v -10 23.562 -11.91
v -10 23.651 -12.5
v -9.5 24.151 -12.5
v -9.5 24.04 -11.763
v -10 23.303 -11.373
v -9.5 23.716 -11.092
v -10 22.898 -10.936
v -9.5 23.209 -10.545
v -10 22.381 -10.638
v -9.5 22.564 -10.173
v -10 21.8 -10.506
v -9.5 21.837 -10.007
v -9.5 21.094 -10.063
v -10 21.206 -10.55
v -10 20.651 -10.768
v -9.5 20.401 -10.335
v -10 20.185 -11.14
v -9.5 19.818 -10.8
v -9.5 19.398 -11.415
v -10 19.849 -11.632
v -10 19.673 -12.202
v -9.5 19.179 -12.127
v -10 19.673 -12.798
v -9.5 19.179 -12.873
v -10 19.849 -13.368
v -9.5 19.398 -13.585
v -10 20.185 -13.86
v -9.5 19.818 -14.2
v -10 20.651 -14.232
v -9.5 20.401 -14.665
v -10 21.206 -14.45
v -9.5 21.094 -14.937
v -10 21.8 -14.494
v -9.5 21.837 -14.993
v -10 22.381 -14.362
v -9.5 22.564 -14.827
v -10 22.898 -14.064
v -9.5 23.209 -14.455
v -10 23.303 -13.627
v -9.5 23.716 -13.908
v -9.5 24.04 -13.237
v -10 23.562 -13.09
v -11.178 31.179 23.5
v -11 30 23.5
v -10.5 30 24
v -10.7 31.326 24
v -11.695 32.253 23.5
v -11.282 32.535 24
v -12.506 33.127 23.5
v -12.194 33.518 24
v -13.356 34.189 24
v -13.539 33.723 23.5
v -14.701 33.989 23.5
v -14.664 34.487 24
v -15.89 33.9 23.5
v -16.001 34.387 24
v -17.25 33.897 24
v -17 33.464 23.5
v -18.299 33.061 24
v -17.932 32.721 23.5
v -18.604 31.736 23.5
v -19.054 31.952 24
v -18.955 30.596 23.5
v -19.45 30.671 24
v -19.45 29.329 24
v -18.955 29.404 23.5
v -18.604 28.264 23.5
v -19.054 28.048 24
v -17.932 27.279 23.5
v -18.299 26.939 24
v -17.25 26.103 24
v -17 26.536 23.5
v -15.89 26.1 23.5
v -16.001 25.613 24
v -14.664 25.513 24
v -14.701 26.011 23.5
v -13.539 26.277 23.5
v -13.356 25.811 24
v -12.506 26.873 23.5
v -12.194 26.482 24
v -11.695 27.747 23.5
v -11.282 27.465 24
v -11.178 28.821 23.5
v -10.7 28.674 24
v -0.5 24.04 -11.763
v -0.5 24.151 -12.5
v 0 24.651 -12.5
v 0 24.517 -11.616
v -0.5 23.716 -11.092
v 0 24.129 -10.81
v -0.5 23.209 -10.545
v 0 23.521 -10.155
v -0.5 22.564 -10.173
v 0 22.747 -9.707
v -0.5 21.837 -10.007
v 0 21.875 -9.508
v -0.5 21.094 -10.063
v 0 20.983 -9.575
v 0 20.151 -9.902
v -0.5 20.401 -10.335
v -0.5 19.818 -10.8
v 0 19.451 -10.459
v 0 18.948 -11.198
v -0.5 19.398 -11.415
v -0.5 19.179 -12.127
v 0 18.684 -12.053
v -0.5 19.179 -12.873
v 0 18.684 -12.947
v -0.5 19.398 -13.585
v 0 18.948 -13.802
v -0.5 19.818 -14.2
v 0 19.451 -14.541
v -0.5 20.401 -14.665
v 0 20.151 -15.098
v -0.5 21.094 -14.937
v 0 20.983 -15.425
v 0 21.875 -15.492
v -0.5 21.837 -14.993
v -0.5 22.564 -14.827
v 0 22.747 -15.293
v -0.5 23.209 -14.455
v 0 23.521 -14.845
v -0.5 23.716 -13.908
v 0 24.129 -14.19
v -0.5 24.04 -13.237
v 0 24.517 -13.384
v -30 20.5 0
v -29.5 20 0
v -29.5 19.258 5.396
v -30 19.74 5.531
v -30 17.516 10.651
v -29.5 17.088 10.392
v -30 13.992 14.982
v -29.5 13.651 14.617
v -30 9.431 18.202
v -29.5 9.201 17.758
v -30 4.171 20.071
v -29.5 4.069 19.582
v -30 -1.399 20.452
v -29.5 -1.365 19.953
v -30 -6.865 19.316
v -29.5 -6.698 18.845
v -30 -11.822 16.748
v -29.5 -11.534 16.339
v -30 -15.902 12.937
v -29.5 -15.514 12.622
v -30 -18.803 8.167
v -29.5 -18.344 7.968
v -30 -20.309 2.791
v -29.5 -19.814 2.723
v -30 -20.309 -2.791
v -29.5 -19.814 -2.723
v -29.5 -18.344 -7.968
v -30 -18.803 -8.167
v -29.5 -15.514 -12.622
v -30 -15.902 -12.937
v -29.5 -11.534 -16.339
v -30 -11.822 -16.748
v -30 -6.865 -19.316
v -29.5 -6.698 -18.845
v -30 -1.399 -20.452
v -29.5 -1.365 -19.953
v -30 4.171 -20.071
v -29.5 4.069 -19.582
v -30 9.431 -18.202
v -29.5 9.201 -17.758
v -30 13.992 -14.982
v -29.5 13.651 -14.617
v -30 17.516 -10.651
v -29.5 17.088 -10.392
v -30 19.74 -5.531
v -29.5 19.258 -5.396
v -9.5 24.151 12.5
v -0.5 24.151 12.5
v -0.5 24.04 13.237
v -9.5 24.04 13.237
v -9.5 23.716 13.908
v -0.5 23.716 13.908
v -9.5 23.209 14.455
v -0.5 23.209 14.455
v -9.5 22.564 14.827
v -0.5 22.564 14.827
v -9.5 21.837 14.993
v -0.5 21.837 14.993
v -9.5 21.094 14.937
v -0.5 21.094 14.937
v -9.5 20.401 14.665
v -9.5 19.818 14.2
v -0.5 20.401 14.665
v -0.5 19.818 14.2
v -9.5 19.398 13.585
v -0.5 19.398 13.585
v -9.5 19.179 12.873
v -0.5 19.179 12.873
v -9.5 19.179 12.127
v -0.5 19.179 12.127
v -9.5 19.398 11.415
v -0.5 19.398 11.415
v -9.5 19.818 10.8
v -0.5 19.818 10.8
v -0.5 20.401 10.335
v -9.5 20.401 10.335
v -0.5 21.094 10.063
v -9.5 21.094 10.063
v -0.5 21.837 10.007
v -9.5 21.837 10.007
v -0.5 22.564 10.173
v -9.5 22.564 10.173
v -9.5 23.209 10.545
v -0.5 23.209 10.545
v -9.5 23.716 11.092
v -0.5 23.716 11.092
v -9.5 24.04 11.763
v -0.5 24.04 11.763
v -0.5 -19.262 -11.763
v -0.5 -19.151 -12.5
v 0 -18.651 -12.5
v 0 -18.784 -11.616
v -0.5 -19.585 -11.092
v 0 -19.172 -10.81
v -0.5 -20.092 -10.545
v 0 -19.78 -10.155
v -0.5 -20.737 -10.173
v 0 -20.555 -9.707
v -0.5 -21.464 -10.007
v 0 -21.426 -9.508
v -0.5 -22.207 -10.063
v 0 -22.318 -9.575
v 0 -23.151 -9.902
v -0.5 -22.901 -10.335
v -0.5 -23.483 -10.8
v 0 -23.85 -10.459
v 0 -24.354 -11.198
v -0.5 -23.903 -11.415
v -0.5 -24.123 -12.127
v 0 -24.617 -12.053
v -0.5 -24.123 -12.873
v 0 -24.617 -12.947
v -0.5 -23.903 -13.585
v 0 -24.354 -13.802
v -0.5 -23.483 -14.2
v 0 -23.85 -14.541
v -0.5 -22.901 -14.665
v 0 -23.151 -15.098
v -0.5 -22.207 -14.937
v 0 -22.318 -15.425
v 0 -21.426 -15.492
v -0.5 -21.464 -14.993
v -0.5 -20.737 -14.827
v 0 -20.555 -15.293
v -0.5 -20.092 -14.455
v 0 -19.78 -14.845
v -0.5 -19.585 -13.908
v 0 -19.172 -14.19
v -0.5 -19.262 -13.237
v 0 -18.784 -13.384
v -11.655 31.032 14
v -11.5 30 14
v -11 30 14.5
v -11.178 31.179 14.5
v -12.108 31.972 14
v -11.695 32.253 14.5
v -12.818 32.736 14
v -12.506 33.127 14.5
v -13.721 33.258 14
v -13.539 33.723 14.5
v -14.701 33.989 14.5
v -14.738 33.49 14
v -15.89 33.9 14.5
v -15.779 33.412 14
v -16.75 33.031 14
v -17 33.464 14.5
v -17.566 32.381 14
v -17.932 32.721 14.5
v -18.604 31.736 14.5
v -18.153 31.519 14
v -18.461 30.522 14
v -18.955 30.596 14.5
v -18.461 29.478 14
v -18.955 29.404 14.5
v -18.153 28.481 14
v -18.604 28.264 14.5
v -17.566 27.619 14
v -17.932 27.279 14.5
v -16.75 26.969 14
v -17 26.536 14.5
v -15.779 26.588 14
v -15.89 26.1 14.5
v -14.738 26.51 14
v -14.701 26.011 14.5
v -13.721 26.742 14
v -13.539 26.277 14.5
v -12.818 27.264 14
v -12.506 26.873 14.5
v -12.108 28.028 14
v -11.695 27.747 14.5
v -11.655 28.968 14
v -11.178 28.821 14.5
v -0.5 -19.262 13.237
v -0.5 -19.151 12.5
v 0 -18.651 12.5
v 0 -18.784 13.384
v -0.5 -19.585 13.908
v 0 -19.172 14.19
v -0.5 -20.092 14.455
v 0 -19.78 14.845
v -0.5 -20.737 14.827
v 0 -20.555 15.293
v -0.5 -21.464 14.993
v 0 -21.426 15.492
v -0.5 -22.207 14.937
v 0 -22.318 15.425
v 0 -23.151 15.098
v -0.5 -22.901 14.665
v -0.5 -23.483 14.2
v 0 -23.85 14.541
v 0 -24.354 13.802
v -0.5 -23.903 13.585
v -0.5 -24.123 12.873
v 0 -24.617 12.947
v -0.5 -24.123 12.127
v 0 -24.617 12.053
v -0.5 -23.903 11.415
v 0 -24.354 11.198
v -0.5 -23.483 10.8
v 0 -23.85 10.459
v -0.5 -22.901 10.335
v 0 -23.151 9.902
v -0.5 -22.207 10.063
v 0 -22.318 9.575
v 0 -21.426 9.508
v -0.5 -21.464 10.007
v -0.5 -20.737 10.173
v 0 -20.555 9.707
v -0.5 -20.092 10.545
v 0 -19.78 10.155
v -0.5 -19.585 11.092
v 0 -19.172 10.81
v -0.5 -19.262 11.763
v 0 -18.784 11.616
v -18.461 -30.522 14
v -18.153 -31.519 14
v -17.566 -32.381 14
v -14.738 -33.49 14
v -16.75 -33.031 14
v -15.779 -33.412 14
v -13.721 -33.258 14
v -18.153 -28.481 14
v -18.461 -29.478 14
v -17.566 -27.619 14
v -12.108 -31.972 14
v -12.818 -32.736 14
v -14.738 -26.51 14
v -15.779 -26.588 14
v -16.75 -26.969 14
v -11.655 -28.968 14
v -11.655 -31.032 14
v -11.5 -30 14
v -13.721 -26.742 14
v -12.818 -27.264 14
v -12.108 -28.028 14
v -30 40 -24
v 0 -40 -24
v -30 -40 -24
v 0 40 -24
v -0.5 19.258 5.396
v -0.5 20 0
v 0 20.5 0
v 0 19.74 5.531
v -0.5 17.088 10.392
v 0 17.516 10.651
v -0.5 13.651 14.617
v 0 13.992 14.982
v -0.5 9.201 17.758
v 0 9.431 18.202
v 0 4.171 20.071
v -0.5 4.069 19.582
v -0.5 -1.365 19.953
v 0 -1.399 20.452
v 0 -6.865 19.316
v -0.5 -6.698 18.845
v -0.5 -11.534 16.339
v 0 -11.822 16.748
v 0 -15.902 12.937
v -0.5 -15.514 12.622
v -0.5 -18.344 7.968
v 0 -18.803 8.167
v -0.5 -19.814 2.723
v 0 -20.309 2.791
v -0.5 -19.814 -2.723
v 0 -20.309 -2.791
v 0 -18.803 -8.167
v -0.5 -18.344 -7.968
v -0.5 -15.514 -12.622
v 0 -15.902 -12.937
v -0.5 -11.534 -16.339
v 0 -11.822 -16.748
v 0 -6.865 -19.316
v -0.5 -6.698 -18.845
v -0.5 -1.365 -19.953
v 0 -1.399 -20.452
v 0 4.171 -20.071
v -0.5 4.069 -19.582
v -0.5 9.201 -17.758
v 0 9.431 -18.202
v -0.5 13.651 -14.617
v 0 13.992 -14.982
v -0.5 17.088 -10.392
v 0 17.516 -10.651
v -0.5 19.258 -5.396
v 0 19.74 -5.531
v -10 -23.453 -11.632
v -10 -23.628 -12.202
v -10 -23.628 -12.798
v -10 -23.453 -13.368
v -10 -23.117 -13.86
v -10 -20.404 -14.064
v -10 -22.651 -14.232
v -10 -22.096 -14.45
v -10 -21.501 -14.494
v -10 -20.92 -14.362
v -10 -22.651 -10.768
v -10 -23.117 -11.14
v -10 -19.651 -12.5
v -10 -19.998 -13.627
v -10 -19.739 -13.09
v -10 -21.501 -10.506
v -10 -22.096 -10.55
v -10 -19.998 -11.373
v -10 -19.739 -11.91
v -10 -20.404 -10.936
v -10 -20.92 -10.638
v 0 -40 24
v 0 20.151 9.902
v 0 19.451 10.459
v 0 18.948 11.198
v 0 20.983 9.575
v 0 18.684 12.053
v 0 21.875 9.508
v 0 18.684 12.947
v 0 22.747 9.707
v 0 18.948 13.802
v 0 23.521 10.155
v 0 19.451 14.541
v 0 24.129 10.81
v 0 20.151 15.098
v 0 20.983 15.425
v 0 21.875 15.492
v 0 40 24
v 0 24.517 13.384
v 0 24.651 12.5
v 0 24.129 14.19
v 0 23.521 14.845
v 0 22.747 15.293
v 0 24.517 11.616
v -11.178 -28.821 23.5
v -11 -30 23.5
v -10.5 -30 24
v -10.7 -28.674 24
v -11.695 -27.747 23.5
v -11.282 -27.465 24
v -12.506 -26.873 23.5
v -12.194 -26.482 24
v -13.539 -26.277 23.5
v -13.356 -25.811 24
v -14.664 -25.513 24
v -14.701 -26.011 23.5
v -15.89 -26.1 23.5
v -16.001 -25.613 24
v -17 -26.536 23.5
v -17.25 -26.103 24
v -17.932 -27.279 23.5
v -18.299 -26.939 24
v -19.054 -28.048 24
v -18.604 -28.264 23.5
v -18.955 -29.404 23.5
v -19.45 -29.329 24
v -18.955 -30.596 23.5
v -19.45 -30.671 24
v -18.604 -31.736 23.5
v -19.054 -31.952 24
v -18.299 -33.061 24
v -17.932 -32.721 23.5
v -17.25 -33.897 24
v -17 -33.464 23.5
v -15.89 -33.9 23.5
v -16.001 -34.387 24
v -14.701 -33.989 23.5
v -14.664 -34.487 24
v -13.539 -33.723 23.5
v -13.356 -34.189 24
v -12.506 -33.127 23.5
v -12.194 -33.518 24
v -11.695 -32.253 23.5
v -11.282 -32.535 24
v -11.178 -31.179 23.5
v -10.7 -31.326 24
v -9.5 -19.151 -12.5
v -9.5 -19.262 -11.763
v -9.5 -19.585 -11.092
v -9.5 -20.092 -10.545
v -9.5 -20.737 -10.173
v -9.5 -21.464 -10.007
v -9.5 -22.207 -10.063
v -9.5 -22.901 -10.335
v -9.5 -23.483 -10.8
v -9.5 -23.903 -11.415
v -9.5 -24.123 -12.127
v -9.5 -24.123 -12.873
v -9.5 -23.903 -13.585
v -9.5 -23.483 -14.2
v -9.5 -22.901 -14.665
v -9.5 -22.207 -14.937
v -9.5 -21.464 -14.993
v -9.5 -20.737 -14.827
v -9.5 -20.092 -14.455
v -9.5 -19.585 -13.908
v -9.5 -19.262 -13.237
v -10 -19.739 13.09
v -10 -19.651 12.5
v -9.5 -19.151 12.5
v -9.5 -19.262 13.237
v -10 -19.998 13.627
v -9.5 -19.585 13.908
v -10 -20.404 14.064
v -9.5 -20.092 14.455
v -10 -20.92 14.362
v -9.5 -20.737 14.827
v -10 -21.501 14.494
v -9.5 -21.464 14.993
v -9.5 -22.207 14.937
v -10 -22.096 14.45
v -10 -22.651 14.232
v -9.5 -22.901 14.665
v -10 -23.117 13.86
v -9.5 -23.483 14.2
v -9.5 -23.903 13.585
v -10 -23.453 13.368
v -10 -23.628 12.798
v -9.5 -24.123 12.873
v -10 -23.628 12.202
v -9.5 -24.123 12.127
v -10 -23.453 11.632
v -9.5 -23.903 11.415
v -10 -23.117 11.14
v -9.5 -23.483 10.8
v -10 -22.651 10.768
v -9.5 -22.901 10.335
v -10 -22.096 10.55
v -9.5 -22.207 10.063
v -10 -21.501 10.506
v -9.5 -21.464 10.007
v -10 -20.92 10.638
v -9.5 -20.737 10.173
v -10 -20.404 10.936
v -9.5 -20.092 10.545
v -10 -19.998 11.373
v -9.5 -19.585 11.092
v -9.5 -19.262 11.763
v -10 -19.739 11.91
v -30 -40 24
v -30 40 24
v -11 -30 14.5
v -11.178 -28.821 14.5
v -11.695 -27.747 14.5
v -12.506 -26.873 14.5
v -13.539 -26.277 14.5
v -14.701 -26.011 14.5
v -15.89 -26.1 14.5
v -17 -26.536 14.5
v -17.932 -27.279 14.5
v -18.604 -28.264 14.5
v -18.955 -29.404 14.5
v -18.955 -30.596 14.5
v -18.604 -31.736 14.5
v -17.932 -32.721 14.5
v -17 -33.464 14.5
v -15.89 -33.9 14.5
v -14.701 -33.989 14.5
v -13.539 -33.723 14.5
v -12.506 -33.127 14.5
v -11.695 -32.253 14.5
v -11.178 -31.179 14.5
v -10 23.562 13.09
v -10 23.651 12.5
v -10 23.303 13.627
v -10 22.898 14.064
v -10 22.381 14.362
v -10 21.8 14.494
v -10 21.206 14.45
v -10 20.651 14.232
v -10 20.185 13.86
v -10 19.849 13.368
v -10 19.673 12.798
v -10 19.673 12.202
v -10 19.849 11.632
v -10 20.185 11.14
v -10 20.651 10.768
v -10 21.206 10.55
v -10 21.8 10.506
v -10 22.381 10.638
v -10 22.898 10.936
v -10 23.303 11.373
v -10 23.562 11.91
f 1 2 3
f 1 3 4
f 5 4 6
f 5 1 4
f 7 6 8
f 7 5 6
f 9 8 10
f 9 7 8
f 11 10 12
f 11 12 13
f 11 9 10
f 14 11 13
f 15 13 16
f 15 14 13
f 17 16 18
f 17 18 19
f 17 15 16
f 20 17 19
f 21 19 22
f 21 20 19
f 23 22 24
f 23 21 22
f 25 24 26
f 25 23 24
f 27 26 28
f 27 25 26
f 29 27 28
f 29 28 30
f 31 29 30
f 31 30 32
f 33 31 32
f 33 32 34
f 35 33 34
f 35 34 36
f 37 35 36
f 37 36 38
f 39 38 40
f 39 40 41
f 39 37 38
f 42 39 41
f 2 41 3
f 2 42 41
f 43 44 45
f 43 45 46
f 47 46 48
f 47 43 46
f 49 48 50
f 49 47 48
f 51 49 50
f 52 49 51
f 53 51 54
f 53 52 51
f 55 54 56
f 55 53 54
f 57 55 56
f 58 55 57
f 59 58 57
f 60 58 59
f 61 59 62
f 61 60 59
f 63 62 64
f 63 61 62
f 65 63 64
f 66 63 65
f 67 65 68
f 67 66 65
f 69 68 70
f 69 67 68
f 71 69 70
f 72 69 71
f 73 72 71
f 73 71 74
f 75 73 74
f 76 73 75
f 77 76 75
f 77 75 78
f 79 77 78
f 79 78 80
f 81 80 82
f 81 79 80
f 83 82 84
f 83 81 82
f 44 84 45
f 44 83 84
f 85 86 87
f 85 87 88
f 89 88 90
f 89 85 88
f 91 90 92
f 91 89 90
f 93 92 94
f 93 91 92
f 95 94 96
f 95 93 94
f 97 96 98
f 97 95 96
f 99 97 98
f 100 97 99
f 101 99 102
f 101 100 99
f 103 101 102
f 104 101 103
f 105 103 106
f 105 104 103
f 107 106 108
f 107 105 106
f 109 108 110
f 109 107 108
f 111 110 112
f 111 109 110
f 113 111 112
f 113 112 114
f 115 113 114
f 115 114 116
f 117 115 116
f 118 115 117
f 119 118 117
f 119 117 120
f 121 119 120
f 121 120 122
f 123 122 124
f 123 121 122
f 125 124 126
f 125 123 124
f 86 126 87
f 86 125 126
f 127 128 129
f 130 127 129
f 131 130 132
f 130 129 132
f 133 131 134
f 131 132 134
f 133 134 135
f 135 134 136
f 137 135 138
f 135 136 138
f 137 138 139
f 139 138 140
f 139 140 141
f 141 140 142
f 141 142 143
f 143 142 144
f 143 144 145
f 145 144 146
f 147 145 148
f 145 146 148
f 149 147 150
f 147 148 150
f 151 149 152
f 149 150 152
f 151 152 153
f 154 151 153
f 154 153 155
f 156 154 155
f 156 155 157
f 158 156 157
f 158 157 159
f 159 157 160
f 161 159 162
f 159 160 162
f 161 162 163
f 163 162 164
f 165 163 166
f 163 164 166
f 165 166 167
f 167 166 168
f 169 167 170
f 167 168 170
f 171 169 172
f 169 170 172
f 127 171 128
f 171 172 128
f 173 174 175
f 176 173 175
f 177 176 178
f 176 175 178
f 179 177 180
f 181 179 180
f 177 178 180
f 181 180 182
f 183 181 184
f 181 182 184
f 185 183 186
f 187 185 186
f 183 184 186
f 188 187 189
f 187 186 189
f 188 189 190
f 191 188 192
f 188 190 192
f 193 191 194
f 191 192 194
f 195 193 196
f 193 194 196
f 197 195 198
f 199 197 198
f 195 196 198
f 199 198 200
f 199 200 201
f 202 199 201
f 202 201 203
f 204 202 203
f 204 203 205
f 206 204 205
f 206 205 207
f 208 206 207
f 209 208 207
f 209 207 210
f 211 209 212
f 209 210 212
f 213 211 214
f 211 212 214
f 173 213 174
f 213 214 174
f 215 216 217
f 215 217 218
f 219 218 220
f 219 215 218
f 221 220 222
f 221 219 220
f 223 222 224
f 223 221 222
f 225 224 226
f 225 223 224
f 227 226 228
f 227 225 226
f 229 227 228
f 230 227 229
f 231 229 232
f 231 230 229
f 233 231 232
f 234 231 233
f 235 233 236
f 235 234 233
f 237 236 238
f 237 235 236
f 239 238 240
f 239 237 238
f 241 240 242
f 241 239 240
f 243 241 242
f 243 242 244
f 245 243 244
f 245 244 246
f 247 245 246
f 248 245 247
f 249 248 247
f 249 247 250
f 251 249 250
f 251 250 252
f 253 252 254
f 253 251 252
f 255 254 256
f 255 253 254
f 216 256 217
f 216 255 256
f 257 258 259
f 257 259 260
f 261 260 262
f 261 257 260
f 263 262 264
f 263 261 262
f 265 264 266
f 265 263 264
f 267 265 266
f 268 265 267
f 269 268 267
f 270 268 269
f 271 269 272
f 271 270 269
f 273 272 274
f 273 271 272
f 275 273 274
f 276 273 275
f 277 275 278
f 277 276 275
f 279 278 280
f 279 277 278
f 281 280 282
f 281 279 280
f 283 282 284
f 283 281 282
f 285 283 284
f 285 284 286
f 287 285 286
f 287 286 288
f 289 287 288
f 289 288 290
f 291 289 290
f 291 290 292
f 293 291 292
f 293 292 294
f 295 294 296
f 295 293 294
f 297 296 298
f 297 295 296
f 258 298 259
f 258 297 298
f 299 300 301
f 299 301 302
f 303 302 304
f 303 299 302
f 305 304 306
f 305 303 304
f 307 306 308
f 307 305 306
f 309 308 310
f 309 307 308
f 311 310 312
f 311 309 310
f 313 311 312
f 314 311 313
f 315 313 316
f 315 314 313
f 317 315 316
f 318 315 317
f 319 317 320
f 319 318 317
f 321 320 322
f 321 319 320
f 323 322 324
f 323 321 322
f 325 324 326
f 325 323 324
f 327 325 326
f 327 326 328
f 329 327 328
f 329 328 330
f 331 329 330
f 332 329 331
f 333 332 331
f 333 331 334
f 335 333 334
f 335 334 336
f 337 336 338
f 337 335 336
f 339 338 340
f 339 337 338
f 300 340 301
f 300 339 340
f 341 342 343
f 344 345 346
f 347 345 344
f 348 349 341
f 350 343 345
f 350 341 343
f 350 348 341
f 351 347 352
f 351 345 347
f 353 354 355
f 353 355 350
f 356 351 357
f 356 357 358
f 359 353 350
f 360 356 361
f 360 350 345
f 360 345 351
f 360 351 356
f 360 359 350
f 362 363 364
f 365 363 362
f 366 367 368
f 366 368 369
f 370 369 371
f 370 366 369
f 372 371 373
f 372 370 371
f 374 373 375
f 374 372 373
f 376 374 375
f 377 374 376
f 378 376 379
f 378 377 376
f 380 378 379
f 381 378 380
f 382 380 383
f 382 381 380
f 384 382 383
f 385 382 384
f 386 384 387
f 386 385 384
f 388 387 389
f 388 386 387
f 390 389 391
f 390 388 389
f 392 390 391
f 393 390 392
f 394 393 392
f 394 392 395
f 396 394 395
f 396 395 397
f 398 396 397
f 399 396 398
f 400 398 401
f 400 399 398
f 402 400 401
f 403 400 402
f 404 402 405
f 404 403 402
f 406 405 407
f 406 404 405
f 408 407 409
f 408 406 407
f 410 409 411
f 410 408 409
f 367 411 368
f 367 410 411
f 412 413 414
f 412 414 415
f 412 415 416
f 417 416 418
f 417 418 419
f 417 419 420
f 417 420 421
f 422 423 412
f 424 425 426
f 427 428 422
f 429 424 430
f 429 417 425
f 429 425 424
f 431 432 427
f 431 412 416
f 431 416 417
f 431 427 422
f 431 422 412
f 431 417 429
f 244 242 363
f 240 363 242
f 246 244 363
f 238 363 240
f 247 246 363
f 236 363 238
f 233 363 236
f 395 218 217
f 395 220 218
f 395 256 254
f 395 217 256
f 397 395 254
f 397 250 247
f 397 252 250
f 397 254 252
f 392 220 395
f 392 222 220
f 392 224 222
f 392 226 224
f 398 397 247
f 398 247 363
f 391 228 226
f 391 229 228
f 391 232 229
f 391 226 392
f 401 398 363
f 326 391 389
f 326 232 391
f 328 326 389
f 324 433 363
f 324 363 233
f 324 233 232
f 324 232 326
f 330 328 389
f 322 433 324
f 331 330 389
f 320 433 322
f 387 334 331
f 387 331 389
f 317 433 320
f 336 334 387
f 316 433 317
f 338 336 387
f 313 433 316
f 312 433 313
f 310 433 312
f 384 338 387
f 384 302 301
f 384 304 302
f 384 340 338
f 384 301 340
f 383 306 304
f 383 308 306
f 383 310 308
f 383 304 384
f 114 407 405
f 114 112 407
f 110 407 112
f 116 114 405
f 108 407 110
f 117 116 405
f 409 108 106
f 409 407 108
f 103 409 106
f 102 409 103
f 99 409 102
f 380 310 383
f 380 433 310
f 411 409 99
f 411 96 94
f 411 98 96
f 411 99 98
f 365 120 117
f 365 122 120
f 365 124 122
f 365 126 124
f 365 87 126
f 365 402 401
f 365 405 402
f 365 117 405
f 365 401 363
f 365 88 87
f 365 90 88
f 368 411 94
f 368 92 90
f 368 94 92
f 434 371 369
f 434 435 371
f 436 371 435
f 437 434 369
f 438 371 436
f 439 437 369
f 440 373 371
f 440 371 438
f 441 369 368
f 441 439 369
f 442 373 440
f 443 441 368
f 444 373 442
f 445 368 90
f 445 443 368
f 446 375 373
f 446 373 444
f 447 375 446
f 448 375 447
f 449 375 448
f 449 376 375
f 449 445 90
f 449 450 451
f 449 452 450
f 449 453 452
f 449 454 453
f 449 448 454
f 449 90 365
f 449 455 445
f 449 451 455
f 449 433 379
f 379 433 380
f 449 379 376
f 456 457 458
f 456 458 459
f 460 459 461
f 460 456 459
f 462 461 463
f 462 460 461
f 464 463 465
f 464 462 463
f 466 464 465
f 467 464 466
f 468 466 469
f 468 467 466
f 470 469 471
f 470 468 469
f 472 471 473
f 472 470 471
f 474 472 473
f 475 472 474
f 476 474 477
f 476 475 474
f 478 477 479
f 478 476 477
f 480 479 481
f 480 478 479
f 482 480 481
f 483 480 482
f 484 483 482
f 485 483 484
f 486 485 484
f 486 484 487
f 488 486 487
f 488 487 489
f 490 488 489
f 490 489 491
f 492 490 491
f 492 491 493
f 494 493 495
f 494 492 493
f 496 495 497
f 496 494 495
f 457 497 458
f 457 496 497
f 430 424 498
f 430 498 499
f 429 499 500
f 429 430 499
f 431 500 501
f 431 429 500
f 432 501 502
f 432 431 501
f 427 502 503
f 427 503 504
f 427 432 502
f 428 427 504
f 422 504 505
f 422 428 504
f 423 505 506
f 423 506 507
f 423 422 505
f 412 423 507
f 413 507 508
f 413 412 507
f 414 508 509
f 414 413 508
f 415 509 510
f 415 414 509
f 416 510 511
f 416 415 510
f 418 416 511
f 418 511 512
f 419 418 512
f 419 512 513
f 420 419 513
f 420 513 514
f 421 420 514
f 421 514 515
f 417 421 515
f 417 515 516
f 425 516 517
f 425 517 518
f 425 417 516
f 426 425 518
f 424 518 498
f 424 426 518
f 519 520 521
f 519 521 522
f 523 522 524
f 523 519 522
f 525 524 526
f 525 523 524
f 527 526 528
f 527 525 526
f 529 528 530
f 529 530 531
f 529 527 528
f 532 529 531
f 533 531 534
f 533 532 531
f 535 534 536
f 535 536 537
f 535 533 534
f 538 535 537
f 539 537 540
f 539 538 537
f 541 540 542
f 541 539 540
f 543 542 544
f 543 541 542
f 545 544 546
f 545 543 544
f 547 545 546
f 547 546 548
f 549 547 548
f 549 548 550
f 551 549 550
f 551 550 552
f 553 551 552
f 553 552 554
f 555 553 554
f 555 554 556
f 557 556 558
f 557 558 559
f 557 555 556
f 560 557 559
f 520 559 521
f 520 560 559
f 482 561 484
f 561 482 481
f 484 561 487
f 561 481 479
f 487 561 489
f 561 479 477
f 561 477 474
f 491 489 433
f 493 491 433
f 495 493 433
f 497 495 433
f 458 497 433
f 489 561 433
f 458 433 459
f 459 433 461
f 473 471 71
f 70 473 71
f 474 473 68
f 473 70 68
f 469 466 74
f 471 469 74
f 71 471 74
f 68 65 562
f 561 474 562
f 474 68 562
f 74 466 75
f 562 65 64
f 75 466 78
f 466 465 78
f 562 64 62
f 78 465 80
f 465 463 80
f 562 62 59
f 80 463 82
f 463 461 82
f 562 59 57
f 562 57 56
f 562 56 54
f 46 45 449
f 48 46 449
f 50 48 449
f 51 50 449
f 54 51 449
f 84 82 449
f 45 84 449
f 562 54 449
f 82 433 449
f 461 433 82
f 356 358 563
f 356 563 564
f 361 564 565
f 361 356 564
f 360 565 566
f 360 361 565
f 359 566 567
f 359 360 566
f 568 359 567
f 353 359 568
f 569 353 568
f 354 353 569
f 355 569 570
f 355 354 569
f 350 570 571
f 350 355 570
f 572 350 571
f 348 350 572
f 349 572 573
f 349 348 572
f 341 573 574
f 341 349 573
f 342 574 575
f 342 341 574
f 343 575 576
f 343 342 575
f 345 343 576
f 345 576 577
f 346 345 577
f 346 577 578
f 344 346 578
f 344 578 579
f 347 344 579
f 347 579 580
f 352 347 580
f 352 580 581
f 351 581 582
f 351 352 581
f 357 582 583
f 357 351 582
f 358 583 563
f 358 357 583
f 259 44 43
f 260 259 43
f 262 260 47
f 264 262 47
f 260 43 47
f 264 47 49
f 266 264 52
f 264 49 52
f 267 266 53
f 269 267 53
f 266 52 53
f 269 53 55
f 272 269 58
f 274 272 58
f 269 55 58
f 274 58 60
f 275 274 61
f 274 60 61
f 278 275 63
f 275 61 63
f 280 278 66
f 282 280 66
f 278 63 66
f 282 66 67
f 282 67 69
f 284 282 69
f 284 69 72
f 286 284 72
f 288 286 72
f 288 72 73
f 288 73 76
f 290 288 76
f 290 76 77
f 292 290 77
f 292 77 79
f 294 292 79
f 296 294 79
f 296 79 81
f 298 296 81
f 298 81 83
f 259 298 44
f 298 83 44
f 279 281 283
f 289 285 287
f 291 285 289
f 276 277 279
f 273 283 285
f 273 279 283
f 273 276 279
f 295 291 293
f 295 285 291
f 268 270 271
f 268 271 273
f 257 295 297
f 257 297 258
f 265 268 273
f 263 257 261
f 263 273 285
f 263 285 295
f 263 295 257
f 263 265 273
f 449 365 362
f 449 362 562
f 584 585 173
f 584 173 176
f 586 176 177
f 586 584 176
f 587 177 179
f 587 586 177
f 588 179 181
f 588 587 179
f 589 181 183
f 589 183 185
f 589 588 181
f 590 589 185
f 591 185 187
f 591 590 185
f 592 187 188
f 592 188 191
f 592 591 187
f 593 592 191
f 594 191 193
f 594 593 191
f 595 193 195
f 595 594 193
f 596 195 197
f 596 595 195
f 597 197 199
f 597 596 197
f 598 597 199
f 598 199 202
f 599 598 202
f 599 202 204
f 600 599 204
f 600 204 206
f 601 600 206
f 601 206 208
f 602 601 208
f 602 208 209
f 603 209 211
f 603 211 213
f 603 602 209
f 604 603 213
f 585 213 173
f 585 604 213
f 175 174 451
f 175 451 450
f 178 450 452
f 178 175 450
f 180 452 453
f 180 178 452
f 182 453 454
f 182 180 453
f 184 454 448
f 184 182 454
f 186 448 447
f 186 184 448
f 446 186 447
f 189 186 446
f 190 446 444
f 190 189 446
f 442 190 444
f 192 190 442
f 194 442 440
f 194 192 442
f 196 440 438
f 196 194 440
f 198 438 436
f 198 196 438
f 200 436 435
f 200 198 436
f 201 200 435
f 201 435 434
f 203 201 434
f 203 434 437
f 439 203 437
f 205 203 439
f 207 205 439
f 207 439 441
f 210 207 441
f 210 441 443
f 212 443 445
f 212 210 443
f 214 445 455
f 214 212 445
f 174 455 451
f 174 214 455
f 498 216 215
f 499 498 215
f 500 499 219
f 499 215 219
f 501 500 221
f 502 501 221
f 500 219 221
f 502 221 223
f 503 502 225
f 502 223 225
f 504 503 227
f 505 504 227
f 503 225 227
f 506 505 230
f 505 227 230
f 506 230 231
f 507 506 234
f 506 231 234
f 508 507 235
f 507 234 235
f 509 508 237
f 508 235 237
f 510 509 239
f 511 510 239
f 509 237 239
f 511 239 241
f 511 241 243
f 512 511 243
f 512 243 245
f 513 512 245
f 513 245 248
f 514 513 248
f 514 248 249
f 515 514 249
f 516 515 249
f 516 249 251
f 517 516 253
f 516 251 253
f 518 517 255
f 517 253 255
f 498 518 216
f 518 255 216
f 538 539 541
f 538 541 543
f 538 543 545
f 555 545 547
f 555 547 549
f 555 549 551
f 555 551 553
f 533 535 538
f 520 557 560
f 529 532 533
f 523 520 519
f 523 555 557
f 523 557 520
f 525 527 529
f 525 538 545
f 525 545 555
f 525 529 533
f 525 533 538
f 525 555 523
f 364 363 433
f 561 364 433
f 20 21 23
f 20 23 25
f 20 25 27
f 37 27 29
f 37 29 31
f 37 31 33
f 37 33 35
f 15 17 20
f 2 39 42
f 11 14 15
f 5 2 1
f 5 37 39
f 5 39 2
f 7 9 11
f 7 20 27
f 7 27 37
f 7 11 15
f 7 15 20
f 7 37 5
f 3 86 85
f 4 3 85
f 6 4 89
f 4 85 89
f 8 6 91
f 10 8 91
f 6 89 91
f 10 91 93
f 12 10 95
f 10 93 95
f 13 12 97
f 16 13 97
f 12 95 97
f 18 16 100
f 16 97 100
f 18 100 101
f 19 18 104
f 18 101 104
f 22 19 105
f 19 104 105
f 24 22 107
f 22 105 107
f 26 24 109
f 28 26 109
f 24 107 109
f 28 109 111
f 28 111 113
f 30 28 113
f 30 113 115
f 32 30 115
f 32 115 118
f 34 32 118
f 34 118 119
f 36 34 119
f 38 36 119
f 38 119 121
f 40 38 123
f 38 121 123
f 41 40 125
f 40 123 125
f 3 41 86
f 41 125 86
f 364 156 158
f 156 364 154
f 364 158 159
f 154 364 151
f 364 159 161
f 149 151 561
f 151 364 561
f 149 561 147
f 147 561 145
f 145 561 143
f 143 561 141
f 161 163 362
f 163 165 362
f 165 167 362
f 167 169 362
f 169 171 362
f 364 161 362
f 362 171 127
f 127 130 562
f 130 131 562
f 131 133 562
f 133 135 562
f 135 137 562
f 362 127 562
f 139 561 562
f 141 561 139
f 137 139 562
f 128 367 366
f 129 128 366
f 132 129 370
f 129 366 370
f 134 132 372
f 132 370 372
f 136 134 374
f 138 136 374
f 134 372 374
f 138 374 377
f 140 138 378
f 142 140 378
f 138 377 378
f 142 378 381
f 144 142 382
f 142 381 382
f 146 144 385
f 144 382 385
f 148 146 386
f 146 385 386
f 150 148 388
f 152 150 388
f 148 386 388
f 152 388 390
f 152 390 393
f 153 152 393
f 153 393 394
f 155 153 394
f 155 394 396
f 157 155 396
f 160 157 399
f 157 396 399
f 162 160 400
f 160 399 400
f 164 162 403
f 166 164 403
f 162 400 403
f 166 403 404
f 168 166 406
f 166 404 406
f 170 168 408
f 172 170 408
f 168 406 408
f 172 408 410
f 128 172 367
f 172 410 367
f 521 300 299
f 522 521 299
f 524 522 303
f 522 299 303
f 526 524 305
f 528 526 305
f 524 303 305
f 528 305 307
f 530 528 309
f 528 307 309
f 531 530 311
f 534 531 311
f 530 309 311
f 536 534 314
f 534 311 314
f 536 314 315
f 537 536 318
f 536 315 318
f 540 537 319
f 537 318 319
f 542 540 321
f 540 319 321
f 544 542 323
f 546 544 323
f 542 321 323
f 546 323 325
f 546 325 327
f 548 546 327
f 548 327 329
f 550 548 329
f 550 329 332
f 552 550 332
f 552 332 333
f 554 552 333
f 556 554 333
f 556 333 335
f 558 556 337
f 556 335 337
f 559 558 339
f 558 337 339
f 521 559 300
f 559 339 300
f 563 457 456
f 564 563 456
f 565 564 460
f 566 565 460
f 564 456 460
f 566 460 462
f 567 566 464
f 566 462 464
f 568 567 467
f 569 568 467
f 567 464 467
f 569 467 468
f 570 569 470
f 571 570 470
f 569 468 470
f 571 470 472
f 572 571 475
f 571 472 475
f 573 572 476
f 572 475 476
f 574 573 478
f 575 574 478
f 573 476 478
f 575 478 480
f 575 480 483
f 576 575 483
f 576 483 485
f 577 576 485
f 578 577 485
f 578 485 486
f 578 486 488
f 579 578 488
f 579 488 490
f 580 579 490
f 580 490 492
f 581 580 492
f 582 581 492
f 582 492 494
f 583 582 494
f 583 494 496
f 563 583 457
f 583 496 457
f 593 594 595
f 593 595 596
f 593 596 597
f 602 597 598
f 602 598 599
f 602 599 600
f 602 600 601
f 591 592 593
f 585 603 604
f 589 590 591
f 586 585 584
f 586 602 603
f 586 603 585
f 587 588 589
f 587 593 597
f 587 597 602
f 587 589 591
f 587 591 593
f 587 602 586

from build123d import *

# Parameters (mm, degrees)
F0_W     = 80
F0_H     = 48
F0_R     = 2.5
F0_R_2   = 20
F1_DEPTH = 30
F2_DEPTH = 10
F3_SIZE  = 0.5
F4_R     = 4
F5_DEPTH = 10
F6_SIZE  = 0.5


with BuildPart() as f1:
    # F0 (on Right) → F1 (new body)
    with BuildSketch(Plane.YZ):
        Rectangle(F0_W, F0_H)
        with Locations((-21.650635, -12.5)):
            Circle(F0_R, mode=Mode.SUBTRACT)
        with Locations((21.650635, -12.5)):
            Circle(F0_R, mode=Mode.SUBTRACT)
        with Locations((-21.650635, 12.5)):
            Circle(F0_R, mode=Mode.SUBTRACT)
        Circle(F0_R_2, mode=Mode.SUBTRACT)
        with Locations((21.650635, 12.5)):
            Circle(F0_R, mode=Mode.SUBTRACT)
        with Locations((-21.650635, 12.5)):
            Circle(F0_R)
        with Locations((-21.650635, -12.5)):
            Circle(F0_R)
        with Locations((21.650635, 12.5)):
            Circle(F0_R)
        with Locations((21.650635, -12.5)):
            Circle(F0_R)
    extrude(amount=-F1_DEPTH)

    # F0 (on Right) → F2 (cut)
    with BuildSketch(Plane.YZ):
        with Locations((-21.650635, 12.5)):
            Circle(F0_R)
        with Locations((21.650635, 12.5)):
            Circle(F0_R)
        with Locations((21.650635, -12.5)):
            Circle(F0_R)
        with Locations((-21.650635, -12.5)):
            Circle(F0_R)
    extrude(amount=-F2_DEPTH, mode=Mode.SUBTRACT)

    # F3
    f3_edges = [f1.edges().sort_by_distance(p)[0] for p in [
        (-15, 20, 0),
        (0, -20, 0),
        (-30, -20, 0),
        (-5, -19.150635, 12.5),
        (0, -24.150635, 12.5),
        (-10, -24.150635, 12.5),
        (-5, -19.150635, -12.5),
        (0, -24.150635, -12.5),
        (-10, -24.150635, -12.5),
        (-5, 24.150635, 12.5),
        (0, 19.150635, 12.5),
        (-10, 19.150635, 12.5),
        (-5, 24.150635, -12.5),
        (0, 19.150635, -12.5),
        (-10, 19.150635, -12.5),
    ]]
    chamfer(f3_edges, length=F3_SIZE)

    # F4 (on face) → F5 (cut)
    with BuildSketch(Plane.XY.offset(24)):
        with Locations((-15, 30)):
            Circle(F4_R)
        with Locations((-15, -30)):
            Circle(F4_R)
    extrude(amount=-F5_DEPTH, mode=Mode.SUBTRACT)

    # F6
    f6_edges = [f1.edges().sort_by_distance(p)[0] for p in [
        (-11, 30, 19),
        (-19, 30, 24),
        (-19, 30, 14),
        (-11, -30, 19),
        (-19, -30, 24),
        (-19, -30, 14),
    ]]
    chamfer(f6_edges, length=F6_SIZE)


solid = f1.part
